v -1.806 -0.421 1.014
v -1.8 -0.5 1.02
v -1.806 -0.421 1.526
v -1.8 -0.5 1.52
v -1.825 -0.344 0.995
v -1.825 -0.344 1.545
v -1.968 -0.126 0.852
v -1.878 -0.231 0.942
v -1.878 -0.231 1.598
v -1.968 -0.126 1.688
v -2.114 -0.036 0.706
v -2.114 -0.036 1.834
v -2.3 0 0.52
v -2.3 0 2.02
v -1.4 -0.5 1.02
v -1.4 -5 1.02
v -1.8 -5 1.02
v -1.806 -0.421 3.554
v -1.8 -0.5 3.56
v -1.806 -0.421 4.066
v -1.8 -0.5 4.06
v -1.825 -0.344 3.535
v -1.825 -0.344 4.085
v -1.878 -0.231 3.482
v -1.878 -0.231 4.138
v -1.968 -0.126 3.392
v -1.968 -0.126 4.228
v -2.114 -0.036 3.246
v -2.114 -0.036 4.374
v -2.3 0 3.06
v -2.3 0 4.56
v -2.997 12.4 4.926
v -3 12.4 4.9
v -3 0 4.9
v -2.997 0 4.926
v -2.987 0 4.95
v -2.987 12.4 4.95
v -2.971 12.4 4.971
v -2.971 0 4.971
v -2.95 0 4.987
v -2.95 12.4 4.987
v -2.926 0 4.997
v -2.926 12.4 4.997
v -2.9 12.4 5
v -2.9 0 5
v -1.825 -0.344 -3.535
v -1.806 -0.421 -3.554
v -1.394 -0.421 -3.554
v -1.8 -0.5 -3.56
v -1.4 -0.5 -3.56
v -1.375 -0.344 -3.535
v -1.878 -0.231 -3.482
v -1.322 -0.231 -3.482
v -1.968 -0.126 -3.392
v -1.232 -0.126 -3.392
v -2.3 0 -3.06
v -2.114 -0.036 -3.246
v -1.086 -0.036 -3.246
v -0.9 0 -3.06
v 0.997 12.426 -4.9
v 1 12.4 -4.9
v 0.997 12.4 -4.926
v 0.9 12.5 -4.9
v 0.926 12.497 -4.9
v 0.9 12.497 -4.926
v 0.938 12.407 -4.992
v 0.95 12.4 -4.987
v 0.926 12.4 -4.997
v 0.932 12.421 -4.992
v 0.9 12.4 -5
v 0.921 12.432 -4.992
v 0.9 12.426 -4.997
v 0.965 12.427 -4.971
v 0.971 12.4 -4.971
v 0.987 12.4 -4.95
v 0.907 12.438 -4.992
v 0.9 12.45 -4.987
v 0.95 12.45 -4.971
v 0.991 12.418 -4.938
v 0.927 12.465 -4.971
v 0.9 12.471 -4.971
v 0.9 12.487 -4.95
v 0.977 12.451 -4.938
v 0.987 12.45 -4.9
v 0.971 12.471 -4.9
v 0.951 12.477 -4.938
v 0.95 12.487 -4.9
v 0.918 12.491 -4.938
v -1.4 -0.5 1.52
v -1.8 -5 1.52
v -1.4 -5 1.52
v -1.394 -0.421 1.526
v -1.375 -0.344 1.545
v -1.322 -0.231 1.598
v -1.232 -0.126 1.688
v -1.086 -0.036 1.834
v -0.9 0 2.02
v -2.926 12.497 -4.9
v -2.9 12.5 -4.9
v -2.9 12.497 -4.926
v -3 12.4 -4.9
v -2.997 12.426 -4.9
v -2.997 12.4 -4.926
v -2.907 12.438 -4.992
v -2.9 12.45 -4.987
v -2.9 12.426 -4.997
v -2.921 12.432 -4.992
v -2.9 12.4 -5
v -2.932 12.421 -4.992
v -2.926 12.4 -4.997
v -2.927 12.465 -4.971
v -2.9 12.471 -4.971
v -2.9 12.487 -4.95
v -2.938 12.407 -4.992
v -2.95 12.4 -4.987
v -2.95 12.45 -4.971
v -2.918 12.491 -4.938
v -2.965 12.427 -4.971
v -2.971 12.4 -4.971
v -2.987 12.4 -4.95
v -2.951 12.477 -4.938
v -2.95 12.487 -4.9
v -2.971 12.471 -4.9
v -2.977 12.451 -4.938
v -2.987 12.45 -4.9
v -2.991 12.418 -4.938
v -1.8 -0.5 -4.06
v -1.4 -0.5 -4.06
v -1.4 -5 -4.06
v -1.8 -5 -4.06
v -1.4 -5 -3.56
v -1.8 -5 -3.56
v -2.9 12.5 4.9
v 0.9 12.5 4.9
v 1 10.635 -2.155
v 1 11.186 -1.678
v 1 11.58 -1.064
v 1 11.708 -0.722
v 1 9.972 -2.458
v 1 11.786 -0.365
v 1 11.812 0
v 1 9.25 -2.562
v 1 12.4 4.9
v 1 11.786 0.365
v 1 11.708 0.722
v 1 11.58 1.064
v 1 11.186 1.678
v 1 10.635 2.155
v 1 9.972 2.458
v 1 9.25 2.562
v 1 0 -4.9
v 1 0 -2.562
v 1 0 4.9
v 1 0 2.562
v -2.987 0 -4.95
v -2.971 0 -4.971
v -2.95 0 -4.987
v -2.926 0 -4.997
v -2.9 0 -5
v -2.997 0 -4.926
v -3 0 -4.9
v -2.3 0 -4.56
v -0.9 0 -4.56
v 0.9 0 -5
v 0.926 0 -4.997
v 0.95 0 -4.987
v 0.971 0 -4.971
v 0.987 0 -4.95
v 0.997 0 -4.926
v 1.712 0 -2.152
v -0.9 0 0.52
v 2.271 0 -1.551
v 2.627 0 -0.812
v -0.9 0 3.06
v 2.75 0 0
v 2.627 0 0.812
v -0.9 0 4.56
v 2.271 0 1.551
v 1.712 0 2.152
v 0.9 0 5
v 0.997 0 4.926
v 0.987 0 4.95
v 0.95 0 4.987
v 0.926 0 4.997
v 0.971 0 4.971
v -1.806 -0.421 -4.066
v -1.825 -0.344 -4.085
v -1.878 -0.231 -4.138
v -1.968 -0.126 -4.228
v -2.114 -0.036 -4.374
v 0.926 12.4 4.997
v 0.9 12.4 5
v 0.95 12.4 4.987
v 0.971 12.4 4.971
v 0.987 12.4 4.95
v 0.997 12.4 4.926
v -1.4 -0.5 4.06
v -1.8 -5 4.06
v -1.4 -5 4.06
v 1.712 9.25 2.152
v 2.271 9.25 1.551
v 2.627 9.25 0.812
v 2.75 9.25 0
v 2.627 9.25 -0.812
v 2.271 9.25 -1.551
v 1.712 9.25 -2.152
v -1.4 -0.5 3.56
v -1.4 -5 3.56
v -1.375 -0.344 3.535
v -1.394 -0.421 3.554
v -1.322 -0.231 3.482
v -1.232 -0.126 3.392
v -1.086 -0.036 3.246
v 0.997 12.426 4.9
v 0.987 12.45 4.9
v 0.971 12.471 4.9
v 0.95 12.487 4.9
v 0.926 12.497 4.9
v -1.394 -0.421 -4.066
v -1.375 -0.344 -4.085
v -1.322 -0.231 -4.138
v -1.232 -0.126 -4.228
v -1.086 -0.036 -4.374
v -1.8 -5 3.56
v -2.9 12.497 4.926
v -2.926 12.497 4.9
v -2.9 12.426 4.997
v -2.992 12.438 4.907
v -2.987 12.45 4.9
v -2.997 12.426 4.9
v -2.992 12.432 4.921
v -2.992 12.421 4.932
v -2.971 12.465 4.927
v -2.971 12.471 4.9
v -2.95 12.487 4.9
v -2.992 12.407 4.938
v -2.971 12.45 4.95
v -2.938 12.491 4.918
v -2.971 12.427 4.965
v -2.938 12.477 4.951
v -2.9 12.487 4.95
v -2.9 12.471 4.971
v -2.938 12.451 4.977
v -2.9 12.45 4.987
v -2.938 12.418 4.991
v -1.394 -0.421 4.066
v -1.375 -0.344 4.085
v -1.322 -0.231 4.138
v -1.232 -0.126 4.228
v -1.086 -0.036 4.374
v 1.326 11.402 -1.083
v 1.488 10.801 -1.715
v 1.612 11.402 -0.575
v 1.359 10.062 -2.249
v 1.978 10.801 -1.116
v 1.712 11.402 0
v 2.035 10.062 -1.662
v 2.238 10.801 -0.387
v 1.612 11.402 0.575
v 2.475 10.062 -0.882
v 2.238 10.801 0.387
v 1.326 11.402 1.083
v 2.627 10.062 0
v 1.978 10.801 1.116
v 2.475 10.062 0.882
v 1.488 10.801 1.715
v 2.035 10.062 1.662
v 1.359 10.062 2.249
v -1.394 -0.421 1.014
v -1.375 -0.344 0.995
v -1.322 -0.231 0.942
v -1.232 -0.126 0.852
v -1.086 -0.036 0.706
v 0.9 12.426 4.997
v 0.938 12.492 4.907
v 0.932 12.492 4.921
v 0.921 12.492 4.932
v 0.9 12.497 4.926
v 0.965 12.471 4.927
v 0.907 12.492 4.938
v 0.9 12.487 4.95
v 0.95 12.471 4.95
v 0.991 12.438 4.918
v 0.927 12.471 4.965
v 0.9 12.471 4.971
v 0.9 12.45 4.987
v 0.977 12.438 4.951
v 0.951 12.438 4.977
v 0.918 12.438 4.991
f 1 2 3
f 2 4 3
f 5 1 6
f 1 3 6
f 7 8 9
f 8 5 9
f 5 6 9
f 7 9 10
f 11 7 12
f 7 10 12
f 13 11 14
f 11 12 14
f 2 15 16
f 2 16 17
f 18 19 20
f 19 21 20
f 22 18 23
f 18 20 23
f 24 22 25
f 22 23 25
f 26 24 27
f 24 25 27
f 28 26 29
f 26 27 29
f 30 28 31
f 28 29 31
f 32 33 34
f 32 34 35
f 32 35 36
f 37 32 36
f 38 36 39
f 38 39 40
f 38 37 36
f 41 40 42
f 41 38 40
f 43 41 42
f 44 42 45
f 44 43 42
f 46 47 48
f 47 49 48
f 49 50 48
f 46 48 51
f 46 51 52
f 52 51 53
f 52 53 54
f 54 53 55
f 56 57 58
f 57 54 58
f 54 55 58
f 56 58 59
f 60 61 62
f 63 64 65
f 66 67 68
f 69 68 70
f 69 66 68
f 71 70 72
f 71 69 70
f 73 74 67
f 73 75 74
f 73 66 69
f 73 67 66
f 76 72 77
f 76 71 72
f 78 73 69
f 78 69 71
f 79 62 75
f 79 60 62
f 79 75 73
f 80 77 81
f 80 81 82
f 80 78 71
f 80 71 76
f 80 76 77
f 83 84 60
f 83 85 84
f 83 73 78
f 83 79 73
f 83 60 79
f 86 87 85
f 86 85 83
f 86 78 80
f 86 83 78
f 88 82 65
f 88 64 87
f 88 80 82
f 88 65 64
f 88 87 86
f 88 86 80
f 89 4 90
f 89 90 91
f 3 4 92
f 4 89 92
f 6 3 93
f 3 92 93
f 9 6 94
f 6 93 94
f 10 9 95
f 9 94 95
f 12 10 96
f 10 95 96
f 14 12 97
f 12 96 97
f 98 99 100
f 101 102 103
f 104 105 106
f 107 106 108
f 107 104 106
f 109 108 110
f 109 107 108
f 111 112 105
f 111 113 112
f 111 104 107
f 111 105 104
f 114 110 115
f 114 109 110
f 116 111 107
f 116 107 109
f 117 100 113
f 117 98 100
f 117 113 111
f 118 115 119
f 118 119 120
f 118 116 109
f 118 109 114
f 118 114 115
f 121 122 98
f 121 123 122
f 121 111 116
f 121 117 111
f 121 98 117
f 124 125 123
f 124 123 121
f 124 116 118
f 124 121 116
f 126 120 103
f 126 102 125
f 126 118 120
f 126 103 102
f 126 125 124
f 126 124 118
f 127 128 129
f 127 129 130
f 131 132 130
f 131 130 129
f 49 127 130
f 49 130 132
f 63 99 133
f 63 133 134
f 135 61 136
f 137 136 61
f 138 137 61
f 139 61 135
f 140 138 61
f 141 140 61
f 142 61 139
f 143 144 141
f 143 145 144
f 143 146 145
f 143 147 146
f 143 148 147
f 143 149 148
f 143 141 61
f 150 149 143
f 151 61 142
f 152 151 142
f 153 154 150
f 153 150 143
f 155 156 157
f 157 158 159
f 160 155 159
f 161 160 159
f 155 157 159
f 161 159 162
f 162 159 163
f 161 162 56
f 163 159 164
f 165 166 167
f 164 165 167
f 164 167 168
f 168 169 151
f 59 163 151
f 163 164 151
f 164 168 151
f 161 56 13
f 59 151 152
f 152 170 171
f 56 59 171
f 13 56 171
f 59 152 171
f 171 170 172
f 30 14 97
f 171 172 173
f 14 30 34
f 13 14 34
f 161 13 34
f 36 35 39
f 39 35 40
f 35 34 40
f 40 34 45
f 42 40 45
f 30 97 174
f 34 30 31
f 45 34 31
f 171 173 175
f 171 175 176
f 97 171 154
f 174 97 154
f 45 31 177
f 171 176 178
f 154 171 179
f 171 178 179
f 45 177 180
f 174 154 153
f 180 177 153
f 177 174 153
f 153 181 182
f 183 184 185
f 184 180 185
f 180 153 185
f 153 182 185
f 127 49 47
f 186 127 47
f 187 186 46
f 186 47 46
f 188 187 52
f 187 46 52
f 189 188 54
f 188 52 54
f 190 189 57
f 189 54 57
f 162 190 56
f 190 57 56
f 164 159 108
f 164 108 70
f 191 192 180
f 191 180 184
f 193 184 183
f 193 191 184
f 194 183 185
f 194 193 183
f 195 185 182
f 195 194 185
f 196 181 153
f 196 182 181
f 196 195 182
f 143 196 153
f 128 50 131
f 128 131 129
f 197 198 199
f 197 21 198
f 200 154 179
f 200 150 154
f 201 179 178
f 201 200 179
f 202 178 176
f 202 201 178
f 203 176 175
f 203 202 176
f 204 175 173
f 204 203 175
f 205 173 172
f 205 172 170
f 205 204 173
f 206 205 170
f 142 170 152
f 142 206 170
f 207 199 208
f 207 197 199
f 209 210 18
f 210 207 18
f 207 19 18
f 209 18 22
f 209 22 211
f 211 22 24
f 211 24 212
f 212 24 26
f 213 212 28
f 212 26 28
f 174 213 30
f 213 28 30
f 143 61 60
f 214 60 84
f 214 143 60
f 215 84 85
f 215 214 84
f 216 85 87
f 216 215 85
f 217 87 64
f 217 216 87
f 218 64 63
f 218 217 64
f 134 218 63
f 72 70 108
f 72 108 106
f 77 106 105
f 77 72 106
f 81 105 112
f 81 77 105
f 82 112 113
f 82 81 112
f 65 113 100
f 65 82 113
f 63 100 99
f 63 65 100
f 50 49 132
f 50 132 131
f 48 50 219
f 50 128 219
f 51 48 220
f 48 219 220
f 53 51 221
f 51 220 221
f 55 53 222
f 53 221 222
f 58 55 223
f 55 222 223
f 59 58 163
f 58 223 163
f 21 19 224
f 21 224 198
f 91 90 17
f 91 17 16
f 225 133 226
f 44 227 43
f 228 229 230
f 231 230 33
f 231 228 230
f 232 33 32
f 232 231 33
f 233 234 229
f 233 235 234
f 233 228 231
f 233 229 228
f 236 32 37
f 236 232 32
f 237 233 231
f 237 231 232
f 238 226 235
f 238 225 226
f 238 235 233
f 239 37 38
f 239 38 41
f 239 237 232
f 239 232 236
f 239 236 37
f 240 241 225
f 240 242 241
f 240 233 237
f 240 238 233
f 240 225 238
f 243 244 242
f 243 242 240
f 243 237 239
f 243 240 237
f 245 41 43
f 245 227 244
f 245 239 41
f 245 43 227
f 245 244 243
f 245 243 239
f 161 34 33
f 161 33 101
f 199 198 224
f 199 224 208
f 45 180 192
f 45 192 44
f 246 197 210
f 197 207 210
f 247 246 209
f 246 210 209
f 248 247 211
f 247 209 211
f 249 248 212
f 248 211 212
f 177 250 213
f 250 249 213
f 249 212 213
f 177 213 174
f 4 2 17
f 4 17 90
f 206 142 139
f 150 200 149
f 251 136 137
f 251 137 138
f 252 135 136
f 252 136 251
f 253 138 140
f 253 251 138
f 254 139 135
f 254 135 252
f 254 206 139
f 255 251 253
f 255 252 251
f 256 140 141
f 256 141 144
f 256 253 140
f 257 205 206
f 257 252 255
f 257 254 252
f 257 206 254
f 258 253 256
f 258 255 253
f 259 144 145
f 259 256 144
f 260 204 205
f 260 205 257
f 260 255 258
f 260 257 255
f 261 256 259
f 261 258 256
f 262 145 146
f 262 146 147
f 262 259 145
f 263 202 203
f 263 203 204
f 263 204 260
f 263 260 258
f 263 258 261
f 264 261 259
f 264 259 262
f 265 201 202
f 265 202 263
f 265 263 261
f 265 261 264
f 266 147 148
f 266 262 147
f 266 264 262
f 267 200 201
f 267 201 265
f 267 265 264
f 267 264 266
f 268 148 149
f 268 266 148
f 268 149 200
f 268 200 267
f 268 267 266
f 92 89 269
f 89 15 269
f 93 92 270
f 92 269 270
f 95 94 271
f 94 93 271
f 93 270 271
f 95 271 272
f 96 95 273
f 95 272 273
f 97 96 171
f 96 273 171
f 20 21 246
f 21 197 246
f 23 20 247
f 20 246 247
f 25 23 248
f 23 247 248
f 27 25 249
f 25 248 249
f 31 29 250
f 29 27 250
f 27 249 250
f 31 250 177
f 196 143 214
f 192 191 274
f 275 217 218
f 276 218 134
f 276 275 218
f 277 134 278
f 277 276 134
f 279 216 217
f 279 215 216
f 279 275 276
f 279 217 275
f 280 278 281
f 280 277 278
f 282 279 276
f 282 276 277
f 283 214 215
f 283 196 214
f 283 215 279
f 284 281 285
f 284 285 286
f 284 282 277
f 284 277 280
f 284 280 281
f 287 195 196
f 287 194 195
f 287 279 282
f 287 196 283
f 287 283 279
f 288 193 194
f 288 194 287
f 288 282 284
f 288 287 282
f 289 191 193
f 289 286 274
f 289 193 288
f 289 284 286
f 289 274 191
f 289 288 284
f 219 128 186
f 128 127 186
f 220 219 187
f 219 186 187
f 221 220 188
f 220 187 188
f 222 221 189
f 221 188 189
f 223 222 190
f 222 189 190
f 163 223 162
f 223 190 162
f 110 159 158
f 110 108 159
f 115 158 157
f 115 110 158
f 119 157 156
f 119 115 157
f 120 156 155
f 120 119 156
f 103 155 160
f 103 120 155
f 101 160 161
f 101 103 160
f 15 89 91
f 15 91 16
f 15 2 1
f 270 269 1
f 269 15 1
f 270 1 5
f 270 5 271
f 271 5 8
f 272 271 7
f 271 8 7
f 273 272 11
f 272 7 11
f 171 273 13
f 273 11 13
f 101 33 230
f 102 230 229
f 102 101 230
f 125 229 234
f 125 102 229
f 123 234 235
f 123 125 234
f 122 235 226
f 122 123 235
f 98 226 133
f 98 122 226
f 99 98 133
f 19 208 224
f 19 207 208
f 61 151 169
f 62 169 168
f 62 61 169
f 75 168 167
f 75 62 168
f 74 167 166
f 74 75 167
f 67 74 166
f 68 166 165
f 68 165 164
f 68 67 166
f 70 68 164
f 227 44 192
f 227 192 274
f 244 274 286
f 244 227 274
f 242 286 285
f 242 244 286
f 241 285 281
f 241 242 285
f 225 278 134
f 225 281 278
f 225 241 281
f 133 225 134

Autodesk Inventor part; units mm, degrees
ref_plane "YZ Plane" through (0, 0, 0) normal (1, 0, 0) x (0, 1, 0)
ref_plane "XZ Plane" through (0, 0, 0) normal (0, 1, 0) x (-1, 0, 0)
ref_plane "XY Plane" through (0, 0, 0) normal (0, 0, 1) x (1, 0, 0)
sketch "Sketch4" plane through (0, 0, 0) normal (1, 0, 0) x (0, 1, 0)
  line L0 (0, 0) -> (12, 0)
  line L1 (12, 0) -> (12, -2.75)
  line L2 (12, -2.75) -> (0, -2.75)
  line L3 (0, -2.75) -> (0, 0)
  line L4 (12, 0) -> (0, 0)
  line L5 (0, 0) -> (0, 2.75)
  line L6 (0, 2.75) -> (12, 2.75)
  line L7 (12, 2.75) -> (12, 0)
  circle A0 centre (9.25, 0) radius 2.75
  point P0 (9.25, 2.75)
  dimension "d7" = 12
  dimension "d8" = 2.75
  dimension "d9" = 12
  dimension "d10" = 2.75
revolve "Revolution1" add sketch "Sketch4" angle 360 about axis through (0, 0, 0) along (0, 1, 0) picked at (9.8215, 0.7167) contours L5 L6 A0 L0 | A0 L0
sketch "Sketch5" plane through (0, 0, 0) normal (0, -1, 0) x (1, 0, 0)
  circle A0 centre (0, 0) radius 2.75 projected
  line L0 (0, 0) -> (1, 0)
  line L1 (1, 0) -> (1, 5)
  line L2 (1, 5) -> (-3, 5)
  line L3 (-3, 5) -> (-3, -5)
  line L4 (-3, -5) -> (1, -5)
  line L5 (1, -5) -> (1, 5)
  dimension "d12" = 1
  dimension "d13" = 5
  dimension "d14" = 4
  dimension "d15" = 10
extrude "Extrusion3" add sketch "Sketch5" against normal blind 12.5 contours L1 L5 A0 | A0 L5 L4 L3 L2 L1 picked at (-1.4731, -0.2204)
fillet "Fillet1" radius 0.1 8 edges at (1, 6.25, 5) (1, 12.5, 0) (-1, 12.5, 5) (-3, 12.5, 0) (1, 6.25, -5) (-1, 12.5, -5) (-3, 6.25, -5) (-3, 6.25, 5)
sketch "Sketch6" plane through (0, 0, 0) normal (0, -1, 0) x (1, 0, 0)
  line L0 (-3, -4.9) -> (-3, 4.9) projected
  line L1 (-1.8, 4.06) -> (-1.4, 4.06)
  line L2 (-1.4, 4.06) -> (-1.4, 3.56)
  line L3 (-1.4, 3.56) -> (-1.8, 3.56)
  line L4 (-1.8, 3.56) -> (-1.8, 4.06)
  line L5 (-1.8, 4.06) -> (-1.4, 3.56) construction
  line L6 (-1.4, 4.06) -> (-1.8, 3.56) construction
  line L7 (-1.8, -3.56) -> (-1.4, -3.56)
  line L8 (-1.4, -3.56) -> (-1.4, -4.06)
  line L9 (-1.4, -4.06) -> (-1.8, -4.06)
  line L10 (-1.8, -4.06) -> (-1.8, -3.56)
  line L11 (-1.8, -3.56) -> (-1.4, -4.06) construction
  line L12 (-1.4, -3.56) -> (-1.8, -4.06) construction
  line L13 (-1.8, 1.52) -> (-1.4, 1.52)
  line L14 (-1.4, 1.52) -> (-1.4, 1.02)
  line L15 (-1.4, 1.02) -> (-1.8, 1.02)
  line L16 (-1.8, 1.02) -> (-1.8, 1.52)
  line L17 (-1.8, 1.52) -> (-1.4, 1.02) construction
  line L18 (-1.4, 1.52) -> (-1.8, 1.02) construction
  point P0 (0, 0)
  dimension "d22" = 0.4
  dimension "d23" = 0.5
  dimension "d24" = 0.4
  dimension "d25" = 0.5
  dimension "d27" = 0.4
  dimension "d28" = 0.5
extrude "Extrusion4" add sketch "Sketch6" along normal blind 5
fillet "Fillet2" radius 0.5 12 edges at (-1.8, 0, 3.81) (-1.6, 0, 4.06) (-1.4, 0, 3.81) (-1.6, 0, 3.56) (-1.4, 0, 1.27) (-1.6, 0, 1.52) (-1.8, 0, 1.27) (-1.6, 0, 1.02) (-1.8, 0, -3.81) (-1.6, 0, -4.06) (-1.4, 0, -3.81) (-1.6, 0, -3.56)
properties part number "TSOP312"
